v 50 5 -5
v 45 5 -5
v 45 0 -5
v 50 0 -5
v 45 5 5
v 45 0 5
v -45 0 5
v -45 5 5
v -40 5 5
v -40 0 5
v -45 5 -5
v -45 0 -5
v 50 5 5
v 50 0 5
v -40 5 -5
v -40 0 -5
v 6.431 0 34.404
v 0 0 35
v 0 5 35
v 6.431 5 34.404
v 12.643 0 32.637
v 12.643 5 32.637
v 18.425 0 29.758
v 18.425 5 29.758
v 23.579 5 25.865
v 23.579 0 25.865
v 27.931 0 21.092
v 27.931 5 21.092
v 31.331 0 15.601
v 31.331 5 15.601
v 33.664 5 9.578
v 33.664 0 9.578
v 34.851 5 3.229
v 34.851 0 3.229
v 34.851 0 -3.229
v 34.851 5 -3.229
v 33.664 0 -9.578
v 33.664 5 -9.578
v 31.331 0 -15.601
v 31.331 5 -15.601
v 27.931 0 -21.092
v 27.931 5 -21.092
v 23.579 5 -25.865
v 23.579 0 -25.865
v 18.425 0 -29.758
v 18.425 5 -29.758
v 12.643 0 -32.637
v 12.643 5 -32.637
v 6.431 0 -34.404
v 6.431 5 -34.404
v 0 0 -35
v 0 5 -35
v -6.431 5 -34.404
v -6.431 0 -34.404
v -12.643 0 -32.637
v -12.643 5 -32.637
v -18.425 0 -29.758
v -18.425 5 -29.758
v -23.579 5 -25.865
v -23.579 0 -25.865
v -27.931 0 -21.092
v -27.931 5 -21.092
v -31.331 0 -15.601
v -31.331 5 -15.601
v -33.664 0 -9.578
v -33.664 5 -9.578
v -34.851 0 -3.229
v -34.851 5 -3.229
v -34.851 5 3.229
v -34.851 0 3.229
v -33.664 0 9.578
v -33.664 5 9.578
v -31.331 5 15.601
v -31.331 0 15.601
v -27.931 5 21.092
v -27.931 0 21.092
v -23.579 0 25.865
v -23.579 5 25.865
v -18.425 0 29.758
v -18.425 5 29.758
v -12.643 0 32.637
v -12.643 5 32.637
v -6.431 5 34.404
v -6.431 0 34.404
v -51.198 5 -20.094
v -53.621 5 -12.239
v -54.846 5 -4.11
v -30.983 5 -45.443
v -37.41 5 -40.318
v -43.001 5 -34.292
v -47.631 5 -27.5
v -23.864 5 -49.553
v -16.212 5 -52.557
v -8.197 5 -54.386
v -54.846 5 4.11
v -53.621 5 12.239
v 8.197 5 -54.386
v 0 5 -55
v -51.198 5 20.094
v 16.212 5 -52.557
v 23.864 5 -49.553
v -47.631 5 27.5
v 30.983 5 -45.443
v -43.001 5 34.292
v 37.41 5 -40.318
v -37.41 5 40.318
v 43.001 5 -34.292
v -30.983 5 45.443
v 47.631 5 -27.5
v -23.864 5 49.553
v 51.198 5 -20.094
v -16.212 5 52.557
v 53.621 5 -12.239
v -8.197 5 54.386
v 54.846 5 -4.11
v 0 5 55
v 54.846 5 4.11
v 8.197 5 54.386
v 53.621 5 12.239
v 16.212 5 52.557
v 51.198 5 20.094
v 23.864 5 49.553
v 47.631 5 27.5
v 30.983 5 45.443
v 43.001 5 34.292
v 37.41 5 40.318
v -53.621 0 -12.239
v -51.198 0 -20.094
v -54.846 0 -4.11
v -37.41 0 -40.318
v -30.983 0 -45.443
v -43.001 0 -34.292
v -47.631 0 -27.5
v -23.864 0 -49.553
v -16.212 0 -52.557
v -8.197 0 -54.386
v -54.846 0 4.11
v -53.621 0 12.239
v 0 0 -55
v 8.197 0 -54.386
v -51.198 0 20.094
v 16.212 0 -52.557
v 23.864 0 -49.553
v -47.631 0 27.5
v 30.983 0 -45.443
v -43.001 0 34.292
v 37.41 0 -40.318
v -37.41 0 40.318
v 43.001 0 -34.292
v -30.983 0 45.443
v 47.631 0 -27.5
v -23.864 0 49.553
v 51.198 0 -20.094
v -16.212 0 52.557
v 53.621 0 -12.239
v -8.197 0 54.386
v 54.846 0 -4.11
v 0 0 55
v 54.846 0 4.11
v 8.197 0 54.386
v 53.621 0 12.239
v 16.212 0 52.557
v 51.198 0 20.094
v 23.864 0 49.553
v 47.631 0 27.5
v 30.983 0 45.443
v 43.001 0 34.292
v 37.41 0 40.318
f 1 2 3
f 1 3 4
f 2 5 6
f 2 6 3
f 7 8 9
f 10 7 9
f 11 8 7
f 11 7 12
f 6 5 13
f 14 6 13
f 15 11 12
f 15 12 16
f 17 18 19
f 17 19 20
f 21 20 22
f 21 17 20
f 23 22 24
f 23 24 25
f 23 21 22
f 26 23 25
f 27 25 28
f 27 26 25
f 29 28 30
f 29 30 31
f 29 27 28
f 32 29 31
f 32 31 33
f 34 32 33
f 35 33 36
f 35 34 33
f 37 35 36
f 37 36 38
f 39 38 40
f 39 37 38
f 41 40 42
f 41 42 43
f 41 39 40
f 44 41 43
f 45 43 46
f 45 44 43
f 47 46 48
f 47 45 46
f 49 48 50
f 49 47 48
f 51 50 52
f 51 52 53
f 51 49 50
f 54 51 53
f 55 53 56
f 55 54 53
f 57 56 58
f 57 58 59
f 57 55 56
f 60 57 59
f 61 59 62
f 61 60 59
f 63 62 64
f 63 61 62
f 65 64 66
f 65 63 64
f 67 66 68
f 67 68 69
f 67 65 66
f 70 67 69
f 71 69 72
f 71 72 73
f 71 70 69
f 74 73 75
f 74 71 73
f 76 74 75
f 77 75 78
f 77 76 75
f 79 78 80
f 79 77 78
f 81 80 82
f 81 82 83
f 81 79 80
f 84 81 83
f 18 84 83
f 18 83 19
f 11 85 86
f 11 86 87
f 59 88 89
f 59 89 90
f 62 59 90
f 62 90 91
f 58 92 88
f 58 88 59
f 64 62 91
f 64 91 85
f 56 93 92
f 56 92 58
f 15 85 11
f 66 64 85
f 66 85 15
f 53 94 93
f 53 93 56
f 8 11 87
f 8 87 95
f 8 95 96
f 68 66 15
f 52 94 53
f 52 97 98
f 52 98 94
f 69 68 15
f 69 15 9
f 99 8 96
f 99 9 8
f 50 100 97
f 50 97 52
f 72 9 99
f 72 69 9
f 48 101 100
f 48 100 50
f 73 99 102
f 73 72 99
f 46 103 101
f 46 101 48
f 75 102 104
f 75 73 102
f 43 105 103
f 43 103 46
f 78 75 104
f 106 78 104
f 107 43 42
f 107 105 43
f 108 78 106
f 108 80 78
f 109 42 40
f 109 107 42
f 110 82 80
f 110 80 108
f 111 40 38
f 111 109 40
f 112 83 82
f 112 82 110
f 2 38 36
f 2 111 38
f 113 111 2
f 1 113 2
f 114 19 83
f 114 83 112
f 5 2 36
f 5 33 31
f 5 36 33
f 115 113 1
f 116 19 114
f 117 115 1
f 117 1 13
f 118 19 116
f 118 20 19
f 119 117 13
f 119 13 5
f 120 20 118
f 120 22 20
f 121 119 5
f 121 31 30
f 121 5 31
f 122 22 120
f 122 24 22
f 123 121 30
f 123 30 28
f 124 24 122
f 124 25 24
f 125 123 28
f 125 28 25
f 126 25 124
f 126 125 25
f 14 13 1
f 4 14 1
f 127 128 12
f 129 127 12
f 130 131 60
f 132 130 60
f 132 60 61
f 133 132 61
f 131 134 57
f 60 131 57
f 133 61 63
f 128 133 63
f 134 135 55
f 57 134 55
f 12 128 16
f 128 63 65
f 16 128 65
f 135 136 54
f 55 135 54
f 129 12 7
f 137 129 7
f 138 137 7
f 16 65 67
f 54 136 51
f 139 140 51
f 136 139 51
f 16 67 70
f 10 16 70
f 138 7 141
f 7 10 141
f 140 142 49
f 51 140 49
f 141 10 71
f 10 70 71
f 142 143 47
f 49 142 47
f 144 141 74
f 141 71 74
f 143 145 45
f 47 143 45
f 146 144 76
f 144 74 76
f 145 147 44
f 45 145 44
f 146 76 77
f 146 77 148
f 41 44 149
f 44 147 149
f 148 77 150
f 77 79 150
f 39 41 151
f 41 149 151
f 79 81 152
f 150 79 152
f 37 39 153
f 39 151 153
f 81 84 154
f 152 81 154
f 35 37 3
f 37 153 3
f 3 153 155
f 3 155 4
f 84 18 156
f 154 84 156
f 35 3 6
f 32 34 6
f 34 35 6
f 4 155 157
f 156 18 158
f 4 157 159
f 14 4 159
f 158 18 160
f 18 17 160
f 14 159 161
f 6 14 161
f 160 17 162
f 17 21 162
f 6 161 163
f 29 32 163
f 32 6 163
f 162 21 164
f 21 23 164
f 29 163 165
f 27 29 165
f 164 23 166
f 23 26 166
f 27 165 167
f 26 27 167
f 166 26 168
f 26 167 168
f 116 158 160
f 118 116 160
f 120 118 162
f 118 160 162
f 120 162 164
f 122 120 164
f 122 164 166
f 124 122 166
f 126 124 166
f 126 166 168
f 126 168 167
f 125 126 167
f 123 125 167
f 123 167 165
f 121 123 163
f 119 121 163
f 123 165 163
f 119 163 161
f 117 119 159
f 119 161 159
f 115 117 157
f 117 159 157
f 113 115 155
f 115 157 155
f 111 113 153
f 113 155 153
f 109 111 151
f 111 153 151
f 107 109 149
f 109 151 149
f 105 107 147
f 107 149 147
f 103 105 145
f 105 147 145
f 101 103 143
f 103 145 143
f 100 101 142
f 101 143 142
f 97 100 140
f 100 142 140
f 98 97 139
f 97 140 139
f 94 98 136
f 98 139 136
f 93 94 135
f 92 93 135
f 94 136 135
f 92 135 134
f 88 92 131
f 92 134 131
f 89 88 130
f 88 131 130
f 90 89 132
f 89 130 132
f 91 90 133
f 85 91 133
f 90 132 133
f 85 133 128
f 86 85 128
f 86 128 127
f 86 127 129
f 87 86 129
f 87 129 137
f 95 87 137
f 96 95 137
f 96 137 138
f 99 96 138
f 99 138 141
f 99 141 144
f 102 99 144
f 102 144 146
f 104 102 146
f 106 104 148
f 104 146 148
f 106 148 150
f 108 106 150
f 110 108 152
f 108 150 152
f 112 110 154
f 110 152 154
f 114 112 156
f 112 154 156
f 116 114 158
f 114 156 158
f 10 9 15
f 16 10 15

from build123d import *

# Parameters (mm, degrees)
SKETCH1_R           = 55
SKETCH1_R_2         = 35
BOSS_EXTRUDE1_DEPTH = 5
SKETCH2_W           = 5
SKETCH2_H           = 10
CUT_EXTRUDE1_DEPTH  = 5


with BuildPart() as part:
    # Sketch1 → Boss-Extrude1 (new body)
    with BuildSketch(Plane(origin=(0, 0, 0), x_dir=(1, 0, 0), z_dir=(0, 1, 0))):
        with Locations(Location((0, 0, 0), (0, 0, 270))):
            Circle(SKETCH1_R)
        with Locations(Location((0, 0, 0), (0, 0, 270))):
            Circle(SKETCH1_R_2, mode=Mode.SUBTRACT)
    extrude(amount=BOSS_EXTRUDE1_DEPTH)

    # Sketch2 → Cut-Extrude1 (cut)
    with BuildSketch(Plane(origin=(0, 5, 0), x_dir=(1, 0, 0), z_dir=(0, 1, 0))):
        with Locations((-42.5, 0)):
            Rectangle(SKETCH2_W, SKETCH2_H)
        with Locations((47.5, 0)):
            Rectangle(SKETCH2_W, SKETCH2_H)
    extrude(amount=-CUT_EXTRUDE1_DEPTH, mode=Mode.SUBTRACT)


solid = part.part
